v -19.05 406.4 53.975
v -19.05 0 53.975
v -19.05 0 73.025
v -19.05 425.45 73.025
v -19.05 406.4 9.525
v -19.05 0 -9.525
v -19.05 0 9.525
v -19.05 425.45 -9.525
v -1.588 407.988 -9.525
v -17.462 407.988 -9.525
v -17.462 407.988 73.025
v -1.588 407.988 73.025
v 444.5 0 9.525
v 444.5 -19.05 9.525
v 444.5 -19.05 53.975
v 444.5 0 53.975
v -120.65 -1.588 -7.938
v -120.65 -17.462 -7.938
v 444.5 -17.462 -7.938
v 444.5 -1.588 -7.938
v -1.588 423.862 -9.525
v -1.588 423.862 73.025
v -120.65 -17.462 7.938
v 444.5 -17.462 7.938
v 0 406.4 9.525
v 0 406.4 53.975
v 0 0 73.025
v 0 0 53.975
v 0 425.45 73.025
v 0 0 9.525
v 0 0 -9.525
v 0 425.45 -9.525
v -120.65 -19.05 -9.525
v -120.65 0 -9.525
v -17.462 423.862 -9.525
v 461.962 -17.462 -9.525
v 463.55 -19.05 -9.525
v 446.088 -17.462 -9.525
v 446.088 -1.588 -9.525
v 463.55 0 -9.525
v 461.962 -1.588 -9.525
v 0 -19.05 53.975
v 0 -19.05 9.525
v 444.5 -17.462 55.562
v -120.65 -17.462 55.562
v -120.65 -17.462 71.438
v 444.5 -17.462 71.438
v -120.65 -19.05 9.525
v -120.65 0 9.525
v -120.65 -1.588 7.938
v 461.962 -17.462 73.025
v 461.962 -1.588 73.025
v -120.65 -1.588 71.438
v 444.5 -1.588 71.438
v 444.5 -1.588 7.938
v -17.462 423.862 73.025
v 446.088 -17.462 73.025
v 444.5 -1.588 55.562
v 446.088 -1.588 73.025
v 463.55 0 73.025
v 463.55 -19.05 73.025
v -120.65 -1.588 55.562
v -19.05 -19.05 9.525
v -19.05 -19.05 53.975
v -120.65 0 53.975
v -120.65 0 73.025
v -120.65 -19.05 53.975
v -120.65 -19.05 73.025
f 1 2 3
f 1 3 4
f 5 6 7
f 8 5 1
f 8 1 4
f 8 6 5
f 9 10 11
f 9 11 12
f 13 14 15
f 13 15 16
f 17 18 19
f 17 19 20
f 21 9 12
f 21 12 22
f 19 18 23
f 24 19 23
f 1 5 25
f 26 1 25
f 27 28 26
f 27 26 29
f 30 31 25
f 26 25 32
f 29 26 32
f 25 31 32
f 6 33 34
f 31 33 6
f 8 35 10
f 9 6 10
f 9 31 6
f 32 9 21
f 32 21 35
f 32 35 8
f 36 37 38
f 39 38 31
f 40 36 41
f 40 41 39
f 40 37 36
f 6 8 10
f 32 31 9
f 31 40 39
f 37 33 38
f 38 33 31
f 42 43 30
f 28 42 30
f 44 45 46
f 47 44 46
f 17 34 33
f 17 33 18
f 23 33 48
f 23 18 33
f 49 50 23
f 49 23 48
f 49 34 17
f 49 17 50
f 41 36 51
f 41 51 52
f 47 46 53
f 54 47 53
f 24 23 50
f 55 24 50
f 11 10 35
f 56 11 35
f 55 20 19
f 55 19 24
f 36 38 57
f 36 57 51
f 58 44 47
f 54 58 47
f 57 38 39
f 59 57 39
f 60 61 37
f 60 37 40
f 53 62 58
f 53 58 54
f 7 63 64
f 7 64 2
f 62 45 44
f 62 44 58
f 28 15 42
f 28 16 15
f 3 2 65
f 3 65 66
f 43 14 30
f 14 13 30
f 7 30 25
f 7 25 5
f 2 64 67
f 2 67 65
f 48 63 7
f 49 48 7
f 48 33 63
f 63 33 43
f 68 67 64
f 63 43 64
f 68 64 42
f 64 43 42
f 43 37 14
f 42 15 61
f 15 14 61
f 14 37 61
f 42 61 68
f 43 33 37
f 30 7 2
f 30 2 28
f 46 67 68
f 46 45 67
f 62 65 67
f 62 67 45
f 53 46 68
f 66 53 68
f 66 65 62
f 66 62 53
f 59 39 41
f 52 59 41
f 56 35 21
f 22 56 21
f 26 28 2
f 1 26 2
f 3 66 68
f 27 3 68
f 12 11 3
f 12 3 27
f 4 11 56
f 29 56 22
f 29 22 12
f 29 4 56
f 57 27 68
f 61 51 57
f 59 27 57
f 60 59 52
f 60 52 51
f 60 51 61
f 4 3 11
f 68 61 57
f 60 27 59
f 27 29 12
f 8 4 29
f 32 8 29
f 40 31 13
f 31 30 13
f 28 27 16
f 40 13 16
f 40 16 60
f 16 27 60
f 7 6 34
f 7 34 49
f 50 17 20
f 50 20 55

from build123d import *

# Parameters (mm, degrees)
SALIENTE_EXTRUIR1_DEPTH = 9.525
SALIENTE_EXTRUIR2_DEPTH = 19.05
SALIENTE_EXTRUIR6_START = -82.55
CROQUIS9_W              = 19.05
CROQUIS9_H              = 19.05
CROQUIS9_W_2            = 15.875
CROQUIS9_H_2            = 15.875
SALIENTE_EXTRUIR6_DEPTH = 82.55
CROQUIS10_W             = 19.05
CROQUIS10_H             = 19.05
SALIENTE_EXTRUIR7_DEPTH = 44.45
CROQUIS11_W             = 19.05
CROQUIS11_H             = 19.05
SALIENTE_EXTRUIR8_DEPTH = 101.6
CROQUIS12_W             = 15.875
CROQUIS12_H             = 15.875
CORTAR_EXTRUIR2_DEPTH   = 565.15


with BuildPart() as part:
    # Croquis2 → Saliente-Extruir1 (new body, symmetric)
    with BuildSketch(Plane.XY):
        Polygon((-19.05, -19.05), (-19.05, 406.4), (0, 406.4), (0, 0), (444.5, 0), (444.5, -19.05), align=None)
    extrude(amount=SALIENTE_EXTRUIR1_DEPTH, both=True)



with BuildPart() as body_2:
    # Croquis3 → Saliente-Extruir2 (new body)
    with BuildSketch(Plane.XY.offset(53.975)):
        Polygon((-19.05, -19.05), (-19.05, 406.4), (0, 406.4), (0, 0), (444.5, 0), (444.5, -19.05), align=None)
    extrude(amount=SALIENTE_EXTRUIR2_DEPTH)


with BuildPart() as part_1:
    add(part.part)

    add(body_2.part)  # Saliente-Extruir6 merges body 2
    # Croquis9 → Saliente-Extruir6 (add)
    with BuildSketch(Plane.XY.offset(73.025).offset(SALIENTE_EXTRUIR6_START)):
        with Locations((-9.525, 415.925)):
            Rectangle(CROQUIS9_W, CROQUIS9_H)
        with Locations((-9.525, 415.925)):
            Rectangle(CROQUIS9_W_2, CROQUIS9_H_2, mode=Mode.SUBTRACT)
        with Locations((454.025, -9.525)):
            Rectangle(CROQUIS9_W, CROQUIS9_H)
        with Locations((454.025, -9.525)):
            Rectangle(CROQUIS9_W_2, CROQUIS9_H_2, mode=Mode.SUBTRACT)
    extrude(amount=SALIENTE_EXTRUIR6_DEPTH)

    # Croquis10 → Saliente-Extruir7 (add)
    with BuildSketch(Plane.XY.offset(9.525)):
        with Locations((-9.525, -9.525)):
            Rectangle(CROQUIS10_W, CROQUIS10_H)
    extrude(amount=SALIENTE_EXTRUIR7_DEPTH)

    # Croquis11 → Saliente-Extruir8 (add)
    with BuildSketch(Plane.ZY.offset(19.05)):
        with Locations((0, -9.525)):
            Rectangle(CROQUIS11_W, CROQUIS11_H)
        with Locations((63.5, -9.525)):
            Rectangle(CROQUIS11_W, CROQUIS11_H)
    extrude(amount=SALIENTE_EXTRUIR8_DEPTH)

    # Croquis12 → Cortar-Extruir2 (cut)
    with BuildSketch(Plane.ZY.offset(120.65)):
        with Locations((0, -9.525)):
            Rectangle(CROQUIS12_W, CROQUIS12_H)
        with Locations((63.5, -9.525)):
            Rectangle(CROQUIS12_W, CROQUIS12_H)
    extrude(amount=-CORTAR_EXTRUIR2_DEPTH, mode=Mode.SUBTRACT)


solid = part_1.part
